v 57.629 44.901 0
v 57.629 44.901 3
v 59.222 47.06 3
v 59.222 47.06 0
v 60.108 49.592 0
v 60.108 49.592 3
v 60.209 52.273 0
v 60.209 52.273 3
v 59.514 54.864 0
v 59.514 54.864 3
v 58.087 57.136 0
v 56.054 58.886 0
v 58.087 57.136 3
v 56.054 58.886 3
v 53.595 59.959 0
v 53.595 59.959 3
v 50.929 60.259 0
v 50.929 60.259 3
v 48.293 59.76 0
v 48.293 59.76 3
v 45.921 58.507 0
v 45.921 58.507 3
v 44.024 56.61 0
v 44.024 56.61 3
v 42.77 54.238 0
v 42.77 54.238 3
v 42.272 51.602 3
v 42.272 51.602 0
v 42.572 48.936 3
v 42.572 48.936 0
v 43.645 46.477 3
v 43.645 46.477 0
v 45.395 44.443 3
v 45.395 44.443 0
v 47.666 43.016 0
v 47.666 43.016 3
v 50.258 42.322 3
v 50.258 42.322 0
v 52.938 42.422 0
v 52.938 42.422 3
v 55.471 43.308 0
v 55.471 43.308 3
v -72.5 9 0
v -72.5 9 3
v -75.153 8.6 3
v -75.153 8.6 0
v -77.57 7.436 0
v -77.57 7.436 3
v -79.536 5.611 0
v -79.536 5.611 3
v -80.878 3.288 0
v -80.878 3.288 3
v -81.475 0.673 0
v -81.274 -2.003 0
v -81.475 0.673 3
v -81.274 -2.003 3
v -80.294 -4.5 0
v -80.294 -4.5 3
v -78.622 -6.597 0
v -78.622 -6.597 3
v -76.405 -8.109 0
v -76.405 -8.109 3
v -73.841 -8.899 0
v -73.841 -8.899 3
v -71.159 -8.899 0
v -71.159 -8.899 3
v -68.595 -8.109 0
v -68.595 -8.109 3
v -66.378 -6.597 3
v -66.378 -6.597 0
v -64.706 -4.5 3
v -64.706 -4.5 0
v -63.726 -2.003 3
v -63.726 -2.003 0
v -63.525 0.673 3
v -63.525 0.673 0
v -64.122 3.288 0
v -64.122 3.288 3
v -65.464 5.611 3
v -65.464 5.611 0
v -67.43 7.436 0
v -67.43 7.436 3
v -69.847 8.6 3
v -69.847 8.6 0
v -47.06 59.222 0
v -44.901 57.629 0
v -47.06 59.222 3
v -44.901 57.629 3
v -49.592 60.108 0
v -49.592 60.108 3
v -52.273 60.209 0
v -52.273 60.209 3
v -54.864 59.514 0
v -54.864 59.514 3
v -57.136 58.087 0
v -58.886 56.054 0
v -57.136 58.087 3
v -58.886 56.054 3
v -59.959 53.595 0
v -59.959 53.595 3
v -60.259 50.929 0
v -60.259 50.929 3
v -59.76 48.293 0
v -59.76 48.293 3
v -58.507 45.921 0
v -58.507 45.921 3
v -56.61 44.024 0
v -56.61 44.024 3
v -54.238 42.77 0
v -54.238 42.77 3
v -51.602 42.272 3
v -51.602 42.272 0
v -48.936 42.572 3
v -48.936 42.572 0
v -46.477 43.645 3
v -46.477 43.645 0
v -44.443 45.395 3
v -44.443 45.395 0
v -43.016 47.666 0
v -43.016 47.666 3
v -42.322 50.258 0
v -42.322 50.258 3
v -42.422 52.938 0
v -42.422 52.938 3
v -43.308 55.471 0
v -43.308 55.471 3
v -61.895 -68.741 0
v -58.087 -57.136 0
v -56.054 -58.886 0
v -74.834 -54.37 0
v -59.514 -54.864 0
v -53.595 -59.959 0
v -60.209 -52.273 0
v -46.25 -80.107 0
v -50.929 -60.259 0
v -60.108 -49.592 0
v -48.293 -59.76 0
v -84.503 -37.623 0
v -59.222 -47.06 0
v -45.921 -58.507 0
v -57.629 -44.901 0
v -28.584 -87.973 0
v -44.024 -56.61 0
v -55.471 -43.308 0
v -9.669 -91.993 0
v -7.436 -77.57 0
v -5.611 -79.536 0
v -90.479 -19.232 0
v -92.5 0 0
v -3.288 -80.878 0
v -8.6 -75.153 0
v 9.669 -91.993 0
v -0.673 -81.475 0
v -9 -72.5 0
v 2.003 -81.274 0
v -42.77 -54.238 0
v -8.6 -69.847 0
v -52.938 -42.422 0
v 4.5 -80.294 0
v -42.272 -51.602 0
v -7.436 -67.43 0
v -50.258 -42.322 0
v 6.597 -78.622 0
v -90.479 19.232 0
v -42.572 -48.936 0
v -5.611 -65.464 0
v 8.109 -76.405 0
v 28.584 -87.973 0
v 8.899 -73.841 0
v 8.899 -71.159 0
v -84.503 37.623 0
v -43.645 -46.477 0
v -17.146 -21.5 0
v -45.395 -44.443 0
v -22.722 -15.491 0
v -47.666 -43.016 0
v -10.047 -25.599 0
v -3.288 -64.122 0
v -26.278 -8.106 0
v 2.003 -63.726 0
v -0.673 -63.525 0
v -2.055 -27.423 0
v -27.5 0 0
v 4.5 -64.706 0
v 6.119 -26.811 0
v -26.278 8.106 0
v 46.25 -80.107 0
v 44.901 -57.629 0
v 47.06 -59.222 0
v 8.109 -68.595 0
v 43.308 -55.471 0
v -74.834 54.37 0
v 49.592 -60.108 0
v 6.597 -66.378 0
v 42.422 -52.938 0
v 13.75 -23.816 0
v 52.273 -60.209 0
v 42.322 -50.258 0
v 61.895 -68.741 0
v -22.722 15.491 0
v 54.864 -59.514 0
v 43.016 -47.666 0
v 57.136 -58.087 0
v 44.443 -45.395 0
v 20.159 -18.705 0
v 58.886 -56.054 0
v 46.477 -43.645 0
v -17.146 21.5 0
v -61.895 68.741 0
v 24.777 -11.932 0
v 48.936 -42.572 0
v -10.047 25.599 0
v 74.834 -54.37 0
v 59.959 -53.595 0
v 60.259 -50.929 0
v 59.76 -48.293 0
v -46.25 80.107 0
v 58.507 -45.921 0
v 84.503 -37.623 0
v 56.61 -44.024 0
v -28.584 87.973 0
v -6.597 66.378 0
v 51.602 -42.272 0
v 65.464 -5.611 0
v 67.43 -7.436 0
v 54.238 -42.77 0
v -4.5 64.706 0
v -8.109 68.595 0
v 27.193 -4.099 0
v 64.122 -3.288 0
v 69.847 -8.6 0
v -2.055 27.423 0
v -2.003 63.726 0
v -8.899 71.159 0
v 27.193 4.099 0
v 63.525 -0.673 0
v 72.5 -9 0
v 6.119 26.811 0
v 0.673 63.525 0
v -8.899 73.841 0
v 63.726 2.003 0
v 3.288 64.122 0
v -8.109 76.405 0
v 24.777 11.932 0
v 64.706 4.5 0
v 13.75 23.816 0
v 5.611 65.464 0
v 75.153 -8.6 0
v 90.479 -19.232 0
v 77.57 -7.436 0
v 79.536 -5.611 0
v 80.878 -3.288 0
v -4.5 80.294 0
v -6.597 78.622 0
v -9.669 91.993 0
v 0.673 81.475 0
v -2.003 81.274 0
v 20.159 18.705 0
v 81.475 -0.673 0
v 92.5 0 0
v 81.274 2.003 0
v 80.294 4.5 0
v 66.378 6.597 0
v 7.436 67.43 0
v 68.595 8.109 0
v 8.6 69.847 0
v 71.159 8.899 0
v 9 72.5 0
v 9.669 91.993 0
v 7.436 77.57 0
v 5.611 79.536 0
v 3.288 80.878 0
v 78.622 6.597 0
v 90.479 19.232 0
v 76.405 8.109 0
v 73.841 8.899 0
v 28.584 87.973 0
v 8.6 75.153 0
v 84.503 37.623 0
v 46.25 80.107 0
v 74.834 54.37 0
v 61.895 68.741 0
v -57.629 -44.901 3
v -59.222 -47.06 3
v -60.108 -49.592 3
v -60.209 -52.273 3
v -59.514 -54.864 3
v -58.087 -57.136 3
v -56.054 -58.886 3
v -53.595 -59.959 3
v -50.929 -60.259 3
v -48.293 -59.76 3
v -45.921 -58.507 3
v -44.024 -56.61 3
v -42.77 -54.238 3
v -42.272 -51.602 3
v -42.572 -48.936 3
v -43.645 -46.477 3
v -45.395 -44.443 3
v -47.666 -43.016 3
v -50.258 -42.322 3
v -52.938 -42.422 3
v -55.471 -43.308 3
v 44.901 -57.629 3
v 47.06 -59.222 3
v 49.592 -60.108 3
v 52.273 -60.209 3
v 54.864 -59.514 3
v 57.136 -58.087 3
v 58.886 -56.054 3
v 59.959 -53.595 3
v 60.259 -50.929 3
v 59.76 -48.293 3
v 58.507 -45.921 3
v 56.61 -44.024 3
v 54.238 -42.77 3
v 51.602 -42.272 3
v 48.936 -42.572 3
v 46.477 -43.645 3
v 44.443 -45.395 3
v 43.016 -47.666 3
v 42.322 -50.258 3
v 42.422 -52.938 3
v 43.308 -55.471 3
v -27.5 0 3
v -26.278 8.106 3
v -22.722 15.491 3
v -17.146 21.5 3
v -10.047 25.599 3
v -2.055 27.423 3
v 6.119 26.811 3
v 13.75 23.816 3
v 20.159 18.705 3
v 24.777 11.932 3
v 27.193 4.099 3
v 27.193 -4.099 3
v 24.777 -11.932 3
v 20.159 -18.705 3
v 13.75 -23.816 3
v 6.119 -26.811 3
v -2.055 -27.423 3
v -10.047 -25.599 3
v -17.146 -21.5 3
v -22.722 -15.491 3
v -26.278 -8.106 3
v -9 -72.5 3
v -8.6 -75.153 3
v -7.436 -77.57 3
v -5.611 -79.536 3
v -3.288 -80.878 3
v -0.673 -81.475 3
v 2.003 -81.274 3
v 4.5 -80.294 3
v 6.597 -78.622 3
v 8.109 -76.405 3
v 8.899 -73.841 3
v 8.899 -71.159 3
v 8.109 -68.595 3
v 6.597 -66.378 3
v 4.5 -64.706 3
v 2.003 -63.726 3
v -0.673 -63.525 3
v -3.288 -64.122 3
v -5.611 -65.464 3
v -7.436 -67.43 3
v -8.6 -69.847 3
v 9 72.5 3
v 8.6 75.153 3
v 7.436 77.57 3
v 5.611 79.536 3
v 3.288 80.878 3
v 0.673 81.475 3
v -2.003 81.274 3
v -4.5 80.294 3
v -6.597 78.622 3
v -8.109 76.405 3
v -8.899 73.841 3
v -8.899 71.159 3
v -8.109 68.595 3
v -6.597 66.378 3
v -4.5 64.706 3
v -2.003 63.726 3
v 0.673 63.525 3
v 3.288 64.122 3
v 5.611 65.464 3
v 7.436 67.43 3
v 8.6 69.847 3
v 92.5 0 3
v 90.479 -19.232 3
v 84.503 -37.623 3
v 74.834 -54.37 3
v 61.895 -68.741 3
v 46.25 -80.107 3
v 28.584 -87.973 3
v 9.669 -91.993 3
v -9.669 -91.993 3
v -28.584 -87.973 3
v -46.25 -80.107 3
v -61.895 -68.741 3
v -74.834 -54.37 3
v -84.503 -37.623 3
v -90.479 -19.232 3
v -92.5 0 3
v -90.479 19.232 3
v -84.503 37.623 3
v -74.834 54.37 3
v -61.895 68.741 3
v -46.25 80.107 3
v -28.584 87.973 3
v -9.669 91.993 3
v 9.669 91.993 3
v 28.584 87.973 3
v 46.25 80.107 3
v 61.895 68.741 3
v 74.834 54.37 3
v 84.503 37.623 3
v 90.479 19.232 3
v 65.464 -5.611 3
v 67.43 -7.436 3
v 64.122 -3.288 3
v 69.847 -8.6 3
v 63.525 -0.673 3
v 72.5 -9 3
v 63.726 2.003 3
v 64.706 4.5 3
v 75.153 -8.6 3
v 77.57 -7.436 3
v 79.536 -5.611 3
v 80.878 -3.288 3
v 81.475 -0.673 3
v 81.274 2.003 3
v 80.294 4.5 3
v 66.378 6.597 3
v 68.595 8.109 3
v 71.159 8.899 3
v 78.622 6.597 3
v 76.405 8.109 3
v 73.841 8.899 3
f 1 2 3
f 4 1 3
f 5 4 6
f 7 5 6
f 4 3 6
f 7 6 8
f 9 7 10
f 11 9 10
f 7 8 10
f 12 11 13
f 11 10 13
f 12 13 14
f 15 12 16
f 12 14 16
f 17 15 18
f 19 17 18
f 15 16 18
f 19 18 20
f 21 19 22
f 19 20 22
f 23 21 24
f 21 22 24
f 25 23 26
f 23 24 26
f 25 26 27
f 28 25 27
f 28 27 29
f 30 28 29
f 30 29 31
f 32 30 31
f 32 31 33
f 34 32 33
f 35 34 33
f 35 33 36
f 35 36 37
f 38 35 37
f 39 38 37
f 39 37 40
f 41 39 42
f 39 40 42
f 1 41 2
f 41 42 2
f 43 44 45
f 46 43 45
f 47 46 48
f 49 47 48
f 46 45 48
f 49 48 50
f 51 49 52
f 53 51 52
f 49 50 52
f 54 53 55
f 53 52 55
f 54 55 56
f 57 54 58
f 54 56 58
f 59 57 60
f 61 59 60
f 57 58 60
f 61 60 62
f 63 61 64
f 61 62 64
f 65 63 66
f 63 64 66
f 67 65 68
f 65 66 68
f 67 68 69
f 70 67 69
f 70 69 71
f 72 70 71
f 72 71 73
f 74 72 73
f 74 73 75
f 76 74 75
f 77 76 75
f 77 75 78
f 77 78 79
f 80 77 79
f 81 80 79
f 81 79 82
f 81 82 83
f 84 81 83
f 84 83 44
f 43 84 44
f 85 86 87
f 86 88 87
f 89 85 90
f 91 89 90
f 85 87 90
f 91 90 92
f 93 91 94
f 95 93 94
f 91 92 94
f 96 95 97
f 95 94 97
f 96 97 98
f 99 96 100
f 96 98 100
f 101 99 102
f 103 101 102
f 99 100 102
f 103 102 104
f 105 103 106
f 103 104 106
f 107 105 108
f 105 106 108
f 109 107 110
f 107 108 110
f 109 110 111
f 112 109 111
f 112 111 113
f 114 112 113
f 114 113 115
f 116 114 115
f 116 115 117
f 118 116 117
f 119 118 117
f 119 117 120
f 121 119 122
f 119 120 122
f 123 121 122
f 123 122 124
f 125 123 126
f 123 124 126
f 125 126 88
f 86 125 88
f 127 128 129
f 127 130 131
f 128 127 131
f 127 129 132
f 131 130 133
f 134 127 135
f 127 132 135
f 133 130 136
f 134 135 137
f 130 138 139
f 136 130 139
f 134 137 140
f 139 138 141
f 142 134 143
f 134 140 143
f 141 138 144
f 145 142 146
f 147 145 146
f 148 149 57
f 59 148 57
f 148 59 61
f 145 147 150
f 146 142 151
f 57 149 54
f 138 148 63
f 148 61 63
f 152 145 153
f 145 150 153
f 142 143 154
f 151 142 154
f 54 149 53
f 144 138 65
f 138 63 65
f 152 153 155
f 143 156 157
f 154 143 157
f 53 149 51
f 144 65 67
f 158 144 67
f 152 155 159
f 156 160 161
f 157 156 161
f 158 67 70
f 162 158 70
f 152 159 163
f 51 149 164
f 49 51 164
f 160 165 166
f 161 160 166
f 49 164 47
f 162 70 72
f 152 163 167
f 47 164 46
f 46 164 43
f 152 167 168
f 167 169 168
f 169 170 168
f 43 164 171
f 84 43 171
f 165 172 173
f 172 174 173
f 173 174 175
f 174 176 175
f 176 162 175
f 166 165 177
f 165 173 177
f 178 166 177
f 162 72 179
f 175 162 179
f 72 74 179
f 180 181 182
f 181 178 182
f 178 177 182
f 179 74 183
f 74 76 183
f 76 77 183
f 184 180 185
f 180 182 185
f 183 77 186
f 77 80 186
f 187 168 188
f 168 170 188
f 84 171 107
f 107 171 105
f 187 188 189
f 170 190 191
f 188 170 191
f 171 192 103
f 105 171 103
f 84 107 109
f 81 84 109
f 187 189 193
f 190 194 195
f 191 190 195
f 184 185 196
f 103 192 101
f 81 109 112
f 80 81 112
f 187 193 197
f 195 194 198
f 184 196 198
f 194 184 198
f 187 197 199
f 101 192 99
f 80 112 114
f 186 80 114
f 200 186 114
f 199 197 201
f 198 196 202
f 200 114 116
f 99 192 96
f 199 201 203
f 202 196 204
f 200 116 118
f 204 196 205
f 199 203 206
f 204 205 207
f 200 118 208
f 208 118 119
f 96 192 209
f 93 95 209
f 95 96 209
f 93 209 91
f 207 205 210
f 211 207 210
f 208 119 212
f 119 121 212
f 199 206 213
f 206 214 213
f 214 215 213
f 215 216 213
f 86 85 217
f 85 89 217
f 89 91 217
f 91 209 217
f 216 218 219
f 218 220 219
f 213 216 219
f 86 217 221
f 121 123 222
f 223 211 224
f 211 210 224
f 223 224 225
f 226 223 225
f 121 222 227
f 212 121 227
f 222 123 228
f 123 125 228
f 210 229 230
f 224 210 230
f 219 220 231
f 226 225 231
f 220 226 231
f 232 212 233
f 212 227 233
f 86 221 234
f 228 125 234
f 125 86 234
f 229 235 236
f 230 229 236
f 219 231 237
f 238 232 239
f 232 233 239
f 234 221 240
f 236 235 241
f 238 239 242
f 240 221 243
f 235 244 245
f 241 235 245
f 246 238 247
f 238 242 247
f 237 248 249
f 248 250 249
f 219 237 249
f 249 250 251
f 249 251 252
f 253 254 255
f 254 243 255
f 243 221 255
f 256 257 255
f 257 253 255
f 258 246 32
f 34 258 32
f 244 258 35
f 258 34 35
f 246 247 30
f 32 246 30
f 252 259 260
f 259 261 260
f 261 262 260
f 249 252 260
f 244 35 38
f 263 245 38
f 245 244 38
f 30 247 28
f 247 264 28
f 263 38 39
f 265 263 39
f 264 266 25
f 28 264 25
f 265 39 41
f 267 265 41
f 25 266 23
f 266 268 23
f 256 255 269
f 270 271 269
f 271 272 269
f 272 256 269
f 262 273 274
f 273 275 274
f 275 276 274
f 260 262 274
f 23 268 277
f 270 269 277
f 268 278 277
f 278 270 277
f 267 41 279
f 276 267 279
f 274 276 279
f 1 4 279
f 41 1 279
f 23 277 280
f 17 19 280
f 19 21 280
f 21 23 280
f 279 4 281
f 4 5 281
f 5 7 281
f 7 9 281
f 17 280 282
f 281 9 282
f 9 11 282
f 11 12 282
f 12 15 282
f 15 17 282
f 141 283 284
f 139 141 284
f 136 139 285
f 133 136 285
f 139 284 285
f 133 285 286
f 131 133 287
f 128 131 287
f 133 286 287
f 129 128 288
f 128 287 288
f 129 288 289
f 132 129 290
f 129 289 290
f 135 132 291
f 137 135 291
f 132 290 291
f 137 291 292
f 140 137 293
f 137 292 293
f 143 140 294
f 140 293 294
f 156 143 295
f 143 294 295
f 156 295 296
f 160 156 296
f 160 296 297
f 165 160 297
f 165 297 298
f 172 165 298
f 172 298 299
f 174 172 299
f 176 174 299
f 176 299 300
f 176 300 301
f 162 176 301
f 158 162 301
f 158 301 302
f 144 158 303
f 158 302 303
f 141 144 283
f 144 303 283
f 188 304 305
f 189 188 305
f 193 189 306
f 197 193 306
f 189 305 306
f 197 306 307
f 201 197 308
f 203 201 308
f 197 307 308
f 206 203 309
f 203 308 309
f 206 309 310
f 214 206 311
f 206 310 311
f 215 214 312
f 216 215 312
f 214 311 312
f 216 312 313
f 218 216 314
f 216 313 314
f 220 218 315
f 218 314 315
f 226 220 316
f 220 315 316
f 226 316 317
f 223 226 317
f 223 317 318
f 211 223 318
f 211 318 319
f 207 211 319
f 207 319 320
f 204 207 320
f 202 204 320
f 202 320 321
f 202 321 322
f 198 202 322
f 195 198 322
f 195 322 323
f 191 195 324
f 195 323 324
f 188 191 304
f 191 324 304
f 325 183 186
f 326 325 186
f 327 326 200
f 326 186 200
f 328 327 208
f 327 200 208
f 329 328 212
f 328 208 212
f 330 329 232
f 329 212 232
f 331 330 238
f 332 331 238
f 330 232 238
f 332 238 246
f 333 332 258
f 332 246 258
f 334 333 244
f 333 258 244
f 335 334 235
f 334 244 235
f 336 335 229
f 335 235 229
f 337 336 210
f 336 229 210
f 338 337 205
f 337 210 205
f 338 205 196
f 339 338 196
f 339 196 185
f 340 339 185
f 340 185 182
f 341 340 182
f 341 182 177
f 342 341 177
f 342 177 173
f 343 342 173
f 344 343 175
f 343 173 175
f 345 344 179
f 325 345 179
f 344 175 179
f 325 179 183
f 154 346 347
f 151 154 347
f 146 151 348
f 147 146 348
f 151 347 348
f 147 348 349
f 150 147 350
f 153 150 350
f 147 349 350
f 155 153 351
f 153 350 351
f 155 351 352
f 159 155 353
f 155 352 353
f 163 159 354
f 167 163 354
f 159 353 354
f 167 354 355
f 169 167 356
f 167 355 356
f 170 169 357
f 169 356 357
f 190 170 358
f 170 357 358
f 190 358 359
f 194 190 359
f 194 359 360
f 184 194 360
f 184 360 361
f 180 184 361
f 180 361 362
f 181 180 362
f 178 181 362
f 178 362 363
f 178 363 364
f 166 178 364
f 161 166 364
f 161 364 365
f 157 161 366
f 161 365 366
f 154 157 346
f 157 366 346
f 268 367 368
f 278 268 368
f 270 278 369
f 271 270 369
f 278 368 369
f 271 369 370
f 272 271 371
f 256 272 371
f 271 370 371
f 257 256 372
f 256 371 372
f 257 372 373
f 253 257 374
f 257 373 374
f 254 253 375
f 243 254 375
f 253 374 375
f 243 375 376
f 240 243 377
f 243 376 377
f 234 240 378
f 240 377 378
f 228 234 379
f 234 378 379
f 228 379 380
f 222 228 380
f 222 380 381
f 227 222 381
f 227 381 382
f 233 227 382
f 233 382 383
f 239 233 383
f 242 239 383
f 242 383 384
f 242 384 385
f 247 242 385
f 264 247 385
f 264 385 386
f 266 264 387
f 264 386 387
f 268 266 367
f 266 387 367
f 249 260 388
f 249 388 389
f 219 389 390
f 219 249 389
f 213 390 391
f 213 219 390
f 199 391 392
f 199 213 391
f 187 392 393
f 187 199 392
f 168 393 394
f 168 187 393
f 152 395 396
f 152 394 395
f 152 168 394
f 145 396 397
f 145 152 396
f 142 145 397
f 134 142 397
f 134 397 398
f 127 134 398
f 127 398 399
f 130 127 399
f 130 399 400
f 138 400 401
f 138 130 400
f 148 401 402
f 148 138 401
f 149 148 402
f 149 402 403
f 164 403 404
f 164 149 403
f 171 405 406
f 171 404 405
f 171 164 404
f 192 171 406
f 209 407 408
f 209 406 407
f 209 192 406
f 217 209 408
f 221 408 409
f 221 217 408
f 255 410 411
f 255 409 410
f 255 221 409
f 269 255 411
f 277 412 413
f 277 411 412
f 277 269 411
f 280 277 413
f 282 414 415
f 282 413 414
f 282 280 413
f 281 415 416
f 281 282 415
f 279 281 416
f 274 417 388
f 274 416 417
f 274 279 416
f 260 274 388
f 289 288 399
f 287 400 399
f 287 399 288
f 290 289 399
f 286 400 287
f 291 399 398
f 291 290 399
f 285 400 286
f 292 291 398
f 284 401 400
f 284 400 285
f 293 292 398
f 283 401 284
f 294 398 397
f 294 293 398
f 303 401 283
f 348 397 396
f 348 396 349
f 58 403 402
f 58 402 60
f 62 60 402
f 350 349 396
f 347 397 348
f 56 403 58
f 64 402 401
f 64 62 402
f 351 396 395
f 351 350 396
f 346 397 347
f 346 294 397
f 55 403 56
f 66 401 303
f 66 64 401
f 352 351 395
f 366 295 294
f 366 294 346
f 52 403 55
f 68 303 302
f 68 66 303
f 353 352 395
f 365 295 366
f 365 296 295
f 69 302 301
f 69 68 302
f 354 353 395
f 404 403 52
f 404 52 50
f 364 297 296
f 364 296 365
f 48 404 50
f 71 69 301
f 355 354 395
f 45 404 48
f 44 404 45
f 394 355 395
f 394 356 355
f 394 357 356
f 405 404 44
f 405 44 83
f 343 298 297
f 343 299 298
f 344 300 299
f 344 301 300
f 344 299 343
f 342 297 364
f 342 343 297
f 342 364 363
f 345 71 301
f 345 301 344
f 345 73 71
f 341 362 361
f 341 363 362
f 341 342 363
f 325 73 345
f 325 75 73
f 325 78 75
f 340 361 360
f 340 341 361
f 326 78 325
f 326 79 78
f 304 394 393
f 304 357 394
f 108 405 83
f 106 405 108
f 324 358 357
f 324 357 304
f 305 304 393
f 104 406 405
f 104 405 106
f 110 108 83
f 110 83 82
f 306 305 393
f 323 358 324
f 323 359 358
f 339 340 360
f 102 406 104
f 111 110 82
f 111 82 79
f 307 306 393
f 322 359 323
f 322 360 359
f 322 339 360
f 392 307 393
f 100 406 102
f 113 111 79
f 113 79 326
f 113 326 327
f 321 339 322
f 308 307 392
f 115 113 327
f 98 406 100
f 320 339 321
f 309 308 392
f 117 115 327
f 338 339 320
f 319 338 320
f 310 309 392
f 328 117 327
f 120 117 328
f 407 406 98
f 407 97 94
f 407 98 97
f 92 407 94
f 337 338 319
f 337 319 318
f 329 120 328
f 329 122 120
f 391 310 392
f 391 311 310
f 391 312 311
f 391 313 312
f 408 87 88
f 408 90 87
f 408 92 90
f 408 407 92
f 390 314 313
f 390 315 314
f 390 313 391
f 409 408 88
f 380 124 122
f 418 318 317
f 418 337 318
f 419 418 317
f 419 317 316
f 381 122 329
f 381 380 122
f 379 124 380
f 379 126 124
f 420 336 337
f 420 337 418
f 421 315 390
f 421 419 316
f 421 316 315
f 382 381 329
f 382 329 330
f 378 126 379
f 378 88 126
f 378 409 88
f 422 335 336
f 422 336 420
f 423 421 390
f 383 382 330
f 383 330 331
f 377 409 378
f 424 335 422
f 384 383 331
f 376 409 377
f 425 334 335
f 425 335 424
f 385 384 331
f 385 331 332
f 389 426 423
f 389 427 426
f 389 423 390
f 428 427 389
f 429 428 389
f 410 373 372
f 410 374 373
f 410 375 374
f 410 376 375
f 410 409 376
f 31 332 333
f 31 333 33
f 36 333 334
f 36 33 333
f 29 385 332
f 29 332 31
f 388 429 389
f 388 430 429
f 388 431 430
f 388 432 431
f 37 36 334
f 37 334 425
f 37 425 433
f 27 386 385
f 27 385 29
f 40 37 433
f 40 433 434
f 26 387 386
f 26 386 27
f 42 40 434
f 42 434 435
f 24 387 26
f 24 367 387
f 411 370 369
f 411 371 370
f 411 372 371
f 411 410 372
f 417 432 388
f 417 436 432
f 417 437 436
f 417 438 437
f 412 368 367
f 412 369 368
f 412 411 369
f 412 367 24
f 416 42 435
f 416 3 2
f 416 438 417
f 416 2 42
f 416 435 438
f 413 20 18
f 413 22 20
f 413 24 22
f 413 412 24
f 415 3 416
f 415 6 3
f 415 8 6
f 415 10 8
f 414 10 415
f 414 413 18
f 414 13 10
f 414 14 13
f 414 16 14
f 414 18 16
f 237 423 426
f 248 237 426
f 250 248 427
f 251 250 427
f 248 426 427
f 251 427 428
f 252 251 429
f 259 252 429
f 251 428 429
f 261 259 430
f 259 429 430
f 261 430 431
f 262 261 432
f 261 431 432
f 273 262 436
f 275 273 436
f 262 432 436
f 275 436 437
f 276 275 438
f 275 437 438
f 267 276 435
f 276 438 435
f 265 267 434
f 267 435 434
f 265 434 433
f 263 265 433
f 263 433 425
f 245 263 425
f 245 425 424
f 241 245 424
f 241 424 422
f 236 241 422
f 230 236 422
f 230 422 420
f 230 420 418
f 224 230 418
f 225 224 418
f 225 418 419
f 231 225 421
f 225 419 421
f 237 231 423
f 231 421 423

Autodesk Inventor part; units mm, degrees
ref_plane "YZ Plane" through (0, 0, 0) normal (1, 0, 0) x (0, 1, 0)
ref_plane "XZ Plane" through (0, 0, 0) normal (0, 1, 0) x (-1, 0, 0)
ref_plane "XY Plane" through (0, 0, 0) normal (0, 0, 1) x (1, 0, 0)
sketch "Sketch1" plane through (0, 0, 0) normal (0, 0, 1) x (1, 0, 0)
  circle A0 centre (0, 0) radius 92.5
  dimension "d22" = 185
extrude "Plate1" add sketch "Sketch1" along normal blind 3
sketch "Sketch5" plane through (0, 0, 3) normal (0, 0, 1) x (1, 0, 0)
  circle A0 centre (0, 0) radius 92.5 projected
  circle A1 centre (0, 72.5) radius 9
  circle A2 centre (0, 0) radius 72.5 construction
  dimension "d23" = 18
  dimension "d30" = 20
extrude "Cut1" cut sketch "Sketch5" against normal blind 3 contours A1
pattern_circular "Circular Pattern1" count 8 over 360 about axis through (0, 0, 0) along (0, 0, 1) of "Cut1"
sketch "Sketch6" plane through (0, 0, 0) normal (0, 0, -1) x (-1, 0, 0)
  circle A0 centre (0, 0) radius 27.5
  dimension "d31" = 55
extrude "Cut2" cut sketch "Sketch6" against normal blind 3
equation "\"d25\" = Thickness"
equation "\"d32\" = Thickness"
equation "\"d2\" = Thickness"
equation "\"BendReliefWidth\" = Thickness"
equation "\"BendReliefDepth\" = 0.5 * Thickness"
equation "\"CornerReliefSize\" = 4 * Thickness"
equation "\"MinimumRemnant\" = 2 * Thickness"
equation "\"TransitionRadius\" = BendRadius"
equation "\"JacobiRadiusSize\" = BendRadius"
equation "\"GapSize\" = Thickness"
equation "\"Thickness\" = 3"
equation "\"BendRadius\" = 5"
properties part number "MSC 922 plug 76 hole" material "Stainless Steel"
